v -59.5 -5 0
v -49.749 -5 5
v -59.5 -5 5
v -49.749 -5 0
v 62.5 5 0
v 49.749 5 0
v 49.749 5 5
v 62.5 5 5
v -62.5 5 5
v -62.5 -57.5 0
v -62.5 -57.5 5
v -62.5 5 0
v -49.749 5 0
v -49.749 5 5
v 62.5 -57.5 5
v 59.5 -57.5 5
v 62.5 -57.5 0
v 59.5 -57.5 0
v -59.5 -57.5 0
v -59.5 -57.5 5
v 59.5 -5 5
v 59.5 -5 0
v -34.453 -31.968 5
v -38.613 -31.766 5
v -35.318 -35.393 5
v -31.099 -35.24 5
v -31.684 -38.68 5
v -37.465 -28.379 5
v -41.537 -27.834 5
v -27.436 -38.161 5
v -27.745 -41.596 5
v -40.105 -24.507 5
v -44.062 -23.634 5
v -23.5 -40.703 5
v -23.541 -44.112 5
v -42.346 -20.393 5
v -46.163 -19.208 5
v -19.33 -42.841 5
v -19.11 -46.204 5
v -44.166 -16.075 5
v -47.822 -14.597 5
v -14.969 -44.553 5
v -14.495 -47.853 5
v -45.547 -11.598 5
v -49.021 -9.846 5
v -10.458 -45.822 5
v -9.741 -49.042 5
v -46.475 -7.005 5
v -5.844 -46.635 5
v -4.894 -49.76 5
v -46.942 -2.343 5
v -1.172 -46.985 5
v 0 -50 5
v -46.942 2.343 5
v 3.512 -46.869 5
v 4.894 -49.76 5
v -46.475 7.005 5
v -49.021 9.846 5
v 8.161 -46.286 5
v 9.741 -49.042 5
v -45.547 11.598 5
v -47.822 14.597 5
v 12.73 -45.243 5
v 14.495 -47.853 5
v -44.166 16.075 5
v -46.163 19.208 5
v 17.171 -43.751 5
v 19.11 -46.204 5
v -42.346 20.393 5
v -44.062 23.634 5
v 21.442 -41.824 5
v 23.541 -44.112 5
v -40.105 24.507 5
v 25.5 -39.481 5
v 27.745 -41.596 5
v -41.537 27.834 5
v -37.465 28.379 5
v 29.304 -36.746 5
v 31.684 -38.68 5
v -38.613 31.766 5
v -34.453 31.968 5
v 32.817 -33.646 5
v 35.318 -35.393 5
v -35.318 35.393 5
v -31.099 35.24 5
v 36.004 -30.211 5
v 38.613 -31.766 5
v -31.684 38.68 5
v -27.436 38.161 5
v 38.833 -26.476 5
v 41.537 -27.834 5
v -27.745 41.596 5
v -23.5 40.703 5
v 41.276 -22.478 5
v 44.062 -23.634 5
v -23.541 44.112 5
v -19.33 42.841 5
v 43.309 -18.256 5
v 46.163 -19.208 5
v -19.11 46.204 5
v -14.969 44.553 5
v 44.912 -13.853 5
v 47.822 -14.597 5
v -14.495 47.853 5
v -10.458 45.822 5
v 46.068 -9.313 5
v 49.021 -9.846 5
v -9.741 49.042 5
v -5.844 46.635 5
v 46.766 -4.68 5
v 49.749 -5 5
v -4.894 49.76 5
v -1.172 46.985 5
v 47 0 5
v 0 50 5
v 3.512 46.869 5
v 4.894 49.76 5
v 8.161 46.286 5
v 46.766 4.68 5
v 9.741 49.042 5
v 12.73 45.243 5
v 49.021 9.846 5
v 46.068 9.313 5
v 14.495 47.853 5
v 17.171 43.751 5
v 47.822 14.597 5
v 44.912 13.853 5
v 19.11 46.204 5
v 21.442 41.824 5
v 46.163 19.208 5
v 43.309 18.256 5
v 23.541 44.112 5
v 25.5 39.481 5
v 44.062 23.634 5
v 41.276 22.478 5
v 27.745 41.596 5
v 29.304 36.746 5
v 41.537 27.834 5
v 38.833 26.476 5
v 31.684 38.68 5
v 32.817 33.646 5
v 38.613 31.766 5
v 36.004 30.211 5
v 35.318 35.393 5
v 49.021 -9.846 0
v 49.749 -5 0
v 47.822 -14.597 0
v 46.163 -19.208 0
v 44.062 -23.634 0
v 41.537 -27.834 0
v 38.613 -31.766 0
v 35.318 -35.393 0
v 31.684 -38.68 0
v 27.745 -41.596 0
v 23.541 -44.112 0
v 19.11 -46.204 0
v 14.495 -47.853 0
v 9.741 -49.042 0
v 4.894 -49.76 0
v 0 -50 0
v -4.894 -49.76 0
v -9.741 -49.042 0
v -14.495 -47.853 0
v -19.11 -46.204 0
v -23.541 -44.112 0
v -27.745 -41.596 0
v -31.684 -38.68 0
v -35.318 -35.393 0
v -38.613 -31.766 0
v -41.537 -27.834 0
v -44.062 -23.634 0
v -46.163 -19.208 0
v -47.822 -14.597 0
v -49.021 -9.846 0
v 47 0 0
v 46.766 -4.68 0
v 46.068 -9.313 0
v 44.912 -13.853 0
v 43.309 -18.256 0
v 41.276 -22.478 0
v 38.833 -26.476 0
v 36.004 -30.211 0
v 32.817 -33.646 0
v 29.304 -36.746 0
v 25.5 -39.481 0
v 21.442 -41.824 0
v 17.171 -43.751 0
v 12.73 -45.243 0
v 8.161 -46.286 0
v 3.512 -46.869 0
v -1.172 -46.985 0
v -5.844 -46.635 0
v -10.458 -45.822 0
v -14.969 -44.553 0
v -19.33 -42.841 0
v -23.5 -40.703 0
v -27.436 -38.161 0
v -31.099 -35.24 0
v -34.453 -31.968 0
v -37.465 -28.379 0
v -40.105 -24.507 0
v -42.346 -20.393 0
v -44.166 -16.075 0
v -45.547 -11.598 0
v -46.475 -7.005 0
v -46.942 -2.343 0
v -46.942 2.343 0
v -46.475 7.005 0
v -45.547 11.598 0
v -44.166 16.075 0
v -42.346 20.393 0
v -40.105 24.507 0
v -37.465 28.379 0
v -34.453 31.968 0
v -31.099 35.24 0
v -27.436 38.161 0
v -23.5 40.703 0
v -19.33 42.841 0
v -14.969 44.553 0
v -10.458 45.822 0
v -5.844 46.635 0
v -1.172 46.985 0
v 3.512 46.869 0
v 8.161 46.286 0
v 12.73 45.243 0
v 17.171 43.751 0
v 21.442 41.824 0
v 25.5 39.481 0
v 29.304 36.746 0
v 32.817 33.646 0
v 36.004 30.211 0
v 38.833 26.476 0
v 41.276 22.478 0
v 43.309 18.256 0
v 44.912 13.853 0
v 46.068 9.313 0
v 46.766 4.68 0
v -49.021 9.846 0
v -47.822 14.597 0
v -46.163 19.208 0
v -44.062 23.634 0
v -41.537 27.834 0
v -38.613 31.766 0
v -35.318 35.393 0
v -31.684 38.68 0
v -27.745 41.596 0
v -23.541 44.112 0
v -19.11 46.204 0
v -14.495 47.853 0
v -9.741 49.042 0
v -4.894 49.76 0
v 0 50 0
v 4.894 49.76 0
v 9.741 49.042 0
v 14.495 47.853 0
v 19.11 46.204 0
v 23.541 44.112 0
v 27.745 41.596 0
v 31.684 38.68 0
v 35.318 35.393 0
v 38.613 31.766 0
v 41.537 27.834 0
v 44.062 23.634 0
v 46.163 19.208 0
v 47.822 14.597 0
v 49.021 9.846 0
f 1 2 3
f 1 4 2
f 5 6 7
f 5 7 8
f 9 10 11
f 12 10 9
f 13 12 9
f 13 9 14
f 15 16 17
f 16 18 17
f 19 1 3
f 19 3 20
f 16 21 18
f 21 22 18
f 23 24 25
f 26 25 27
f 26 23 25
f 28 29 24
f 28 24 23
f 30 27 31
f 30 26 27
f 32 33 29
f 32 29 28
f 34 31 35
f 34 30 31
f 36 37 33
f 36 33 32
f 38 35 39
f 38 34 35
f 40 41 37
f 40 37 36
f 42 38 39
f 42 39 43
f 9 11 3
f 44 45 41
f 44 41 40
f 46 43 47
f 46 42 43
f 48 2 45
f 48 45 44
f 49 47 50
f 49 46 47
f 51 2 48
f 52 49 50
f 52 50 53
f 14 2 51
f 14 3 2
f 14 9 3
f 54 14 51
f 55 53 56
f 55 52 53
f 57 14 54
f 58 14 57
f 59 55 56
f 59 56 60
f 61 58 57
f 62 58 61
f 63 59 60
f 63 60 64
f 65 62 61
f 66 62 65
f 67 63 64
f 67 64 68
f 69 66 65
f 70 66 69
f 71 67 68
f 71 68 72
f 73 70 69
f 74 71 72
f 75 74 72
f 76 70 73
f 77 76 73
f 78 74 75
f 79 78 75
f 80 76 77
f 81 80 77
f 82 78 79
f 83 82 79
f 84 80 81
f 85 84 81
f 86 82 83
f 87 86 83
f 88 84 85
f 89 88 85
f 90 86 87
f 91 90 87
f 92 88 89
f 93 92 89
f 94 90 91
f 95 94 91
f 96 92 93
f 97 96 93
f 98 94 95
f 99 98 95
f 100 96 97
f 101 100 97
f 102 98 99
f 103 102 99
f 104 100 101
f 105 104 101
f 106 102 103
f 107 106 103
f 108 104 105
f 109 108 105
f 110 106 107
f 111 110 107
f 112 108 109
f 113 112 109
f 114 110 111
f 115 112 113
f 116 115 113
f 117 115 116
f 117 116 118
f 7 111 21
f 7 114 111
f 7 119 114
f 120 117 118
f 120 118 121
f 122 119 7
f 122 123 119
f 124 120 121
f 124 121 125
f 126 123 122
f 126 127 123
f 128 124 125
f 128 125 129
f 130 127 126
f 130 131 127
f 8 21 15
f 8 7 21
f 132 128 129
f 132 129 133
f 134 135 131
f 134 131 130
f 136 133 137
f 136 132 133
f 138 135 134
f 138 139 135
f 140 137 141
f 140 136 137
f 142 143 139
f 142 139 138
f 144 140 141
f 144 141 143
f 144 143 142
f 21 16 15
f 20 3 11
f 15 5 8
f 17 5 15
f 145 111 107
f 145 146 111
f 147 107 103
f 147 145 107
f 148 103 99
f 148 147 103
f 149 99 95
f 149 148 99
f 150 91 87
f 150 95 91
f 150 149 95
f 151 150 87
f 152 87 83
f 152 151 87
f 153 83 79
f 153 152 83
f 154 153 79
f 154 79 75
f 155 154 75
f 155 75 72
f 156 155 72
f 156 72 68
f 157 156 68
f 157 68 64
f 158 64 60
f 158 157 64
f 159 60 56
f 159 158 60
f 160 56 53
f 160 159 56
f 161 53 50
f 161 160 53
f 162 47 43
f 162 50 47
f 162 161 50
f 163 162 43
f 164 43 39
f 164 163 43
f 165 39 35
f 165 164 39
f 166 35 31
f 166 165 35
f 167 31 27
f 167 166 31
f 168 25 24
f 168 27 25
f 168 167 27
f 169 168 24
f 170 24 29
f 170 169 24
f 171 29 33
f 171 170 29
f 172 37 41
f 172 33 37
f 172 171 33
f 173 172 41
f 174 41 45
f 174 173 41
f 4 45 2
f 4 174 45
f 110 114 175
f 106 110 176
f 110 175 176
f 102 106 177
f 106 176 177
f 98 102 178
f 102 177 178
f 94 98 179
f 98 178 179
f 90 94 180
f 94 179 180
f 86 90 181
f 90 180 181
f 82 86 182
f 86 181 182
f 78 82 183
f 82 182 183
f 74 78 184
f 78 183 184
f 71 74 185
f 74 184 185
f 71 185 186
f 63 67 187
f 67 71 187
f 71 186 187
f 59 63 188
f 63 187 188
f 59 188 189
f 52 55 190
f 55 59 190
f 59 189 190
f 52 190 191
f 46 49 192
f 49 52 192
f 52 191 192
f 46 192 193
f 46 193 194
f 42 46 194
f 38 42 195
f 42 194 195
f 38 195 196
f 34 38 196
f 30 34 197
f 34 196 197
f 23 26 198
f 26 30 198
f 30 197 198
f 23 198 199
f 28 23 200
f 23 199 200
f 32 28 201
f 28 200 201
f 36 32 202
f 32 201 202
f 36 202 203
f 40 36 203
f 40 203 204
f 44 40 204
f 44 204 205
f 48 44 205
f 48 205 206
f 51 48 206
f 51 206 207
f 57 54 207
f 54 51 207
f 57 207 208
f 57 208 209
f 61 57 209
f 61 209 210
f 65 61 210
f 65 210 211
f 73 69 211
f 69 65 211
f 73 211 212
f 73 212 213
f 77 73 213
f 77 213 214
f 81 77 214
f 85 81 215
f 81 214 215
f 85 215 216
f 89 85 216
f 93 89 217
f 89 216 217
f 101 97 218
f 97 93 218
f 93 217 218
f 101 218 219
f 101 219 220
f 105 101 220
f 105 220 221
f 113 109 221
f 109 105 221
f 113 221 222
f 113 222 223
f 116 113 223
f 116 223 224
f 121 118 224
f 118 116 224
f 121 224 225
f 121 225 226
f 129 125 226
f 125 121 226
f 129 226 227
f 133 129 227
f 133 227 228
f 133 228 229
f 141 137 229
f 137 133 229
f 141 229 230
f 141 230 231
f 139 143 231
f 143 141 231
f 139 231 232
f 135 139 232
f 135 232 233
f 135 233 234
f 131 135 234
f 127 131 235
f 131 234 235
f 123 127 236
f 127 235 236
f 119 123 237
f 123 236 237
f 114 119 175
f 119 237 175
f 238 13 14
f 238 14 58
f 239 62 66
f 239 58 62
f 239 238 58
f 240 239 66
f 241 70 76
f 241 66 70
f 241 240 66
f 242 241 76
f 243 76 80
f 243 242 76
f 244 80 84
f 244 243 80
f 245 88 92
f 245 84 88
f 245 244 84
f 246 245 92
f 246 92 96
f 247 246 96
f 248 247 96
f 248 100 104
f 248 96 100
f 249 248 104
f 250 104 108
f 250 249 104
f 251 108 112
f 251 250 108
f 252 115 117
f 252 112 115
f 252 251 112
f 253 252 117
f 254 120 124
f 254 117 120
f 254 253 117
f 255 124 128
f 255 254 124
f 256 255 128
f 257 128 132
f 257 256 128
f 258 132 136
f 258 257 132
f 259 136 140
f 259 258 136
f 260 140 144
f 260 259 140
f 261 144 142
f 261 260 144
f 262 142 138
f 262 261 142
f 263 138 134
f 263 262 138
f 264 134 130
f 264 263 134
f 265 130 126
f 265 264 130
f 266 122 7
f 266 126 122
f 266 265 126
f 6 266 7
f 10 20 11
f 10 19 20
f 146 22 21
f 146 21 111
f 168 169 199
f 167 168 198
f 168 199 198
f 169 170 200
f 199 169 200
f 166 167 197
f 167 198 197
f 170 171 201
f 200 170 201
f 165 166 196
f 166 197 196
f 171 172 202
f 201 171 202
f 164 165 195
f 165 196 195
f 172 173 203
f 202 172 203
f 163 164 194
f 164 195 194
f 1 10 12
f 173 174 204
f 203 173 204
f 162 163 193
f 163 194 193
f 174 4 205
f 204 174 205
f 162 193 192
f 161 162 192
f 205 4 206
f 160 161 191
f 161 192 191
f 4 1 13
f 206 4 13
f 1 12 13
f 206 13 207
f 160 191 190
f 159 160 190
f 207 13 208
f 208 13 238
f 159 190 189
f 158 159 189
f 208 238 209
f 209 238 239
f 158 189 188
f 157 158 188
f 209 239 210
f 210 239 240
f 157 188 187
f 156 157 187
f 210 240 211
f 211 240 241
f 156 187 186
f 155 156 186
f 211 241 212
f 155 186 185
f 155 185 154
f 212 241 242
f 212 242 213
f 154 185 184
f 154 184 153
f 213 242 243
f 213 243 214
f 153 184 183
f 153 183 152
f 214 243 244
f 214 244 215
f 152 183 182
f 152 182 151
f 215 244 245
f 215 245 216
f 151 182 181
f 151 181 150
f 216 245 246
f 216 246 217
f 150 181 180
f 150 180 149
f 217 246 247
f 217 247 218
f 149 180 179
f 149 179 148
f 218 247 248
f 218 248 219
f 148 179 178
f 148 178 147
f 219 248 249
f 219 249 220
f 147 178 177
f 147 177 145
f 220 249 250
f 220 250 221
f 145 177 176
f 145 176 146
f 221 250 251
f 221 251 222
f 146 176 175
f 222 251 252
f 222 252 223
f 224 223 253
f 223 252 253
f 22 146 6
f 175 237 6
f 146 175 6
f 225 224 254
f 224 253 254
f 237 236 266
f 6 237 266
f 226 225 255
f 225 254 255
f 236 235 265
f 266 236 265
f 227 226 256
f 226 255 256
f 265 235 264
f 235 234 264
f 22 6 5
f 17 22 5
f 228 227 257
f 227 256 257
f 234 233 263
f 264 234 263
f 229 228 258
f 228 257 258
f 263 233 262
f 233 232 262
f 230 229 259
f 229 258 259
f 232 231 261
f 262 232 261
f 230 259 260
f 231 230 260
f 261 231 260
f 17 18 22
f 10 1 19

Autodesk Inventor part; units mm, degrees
ref_plane "YZ Plane" through (0, 0, 0) normal (1, 0, 0) x (0, 1, 0)
ref_plane "XZ Plane" through (0, 0, 0) normal (0, 1, 0) x (-1, 0, 0)
ref_plane "XY Plane" through (0, 0, 0) normal (0, 0, 1) x (1, 0, 0)
sketch "Sketch1" plane through (0, 0, 0) normal (0, 0, 1) x (1, 0, 0)
  circle A0 centre (0, 0) radius 50
  circle A1 centre (0, 0) radius 47
  line L0 (37.5, 5) -> (62.5, 5)
  line L1 (62.5, 5) -> (62.5, -5)
  line L2 (62.5, -5) -> (37.5, -5)
  line L3 (37.5, -5) -> (37.5, 5)
  line L4 (37.5, 5) -> (62.5, -5) construction
  line L5 (62.5, 5) -> (37.5, -5) construction
  line L6 (-62.5, 5) -> (-37.5, 5)
  line L7 (-37.5, 5) -> (-37.5, -5)
  line L8 (-37.5, -5) -> (-62.5, -5)
  line L9 (-62.5, -5) -> (-62.5, 5)
  line L10 (-62.5, 5) -> (-37.5, -5) construction
  line L11 (-37.5, 5) -> (-62.5, -5) construction
  line L12 (62.5, 0) -> (59.5, 0)
  line L13 (59.5, 0) -> (59.5, -57.5)
  line L14 (59.5, -57.5) -> (62.5, -57.5)
  line L15 (62.5, -57.5) -> (62.5, 0)
  line L16 (-62.5, 0) -> (-59.5, 0)
  line L17 (-59.5, 0) -> (-59.5, -57.5)
  line L18 (-59.5, -57.5) -> (-62.5, -57.5)
  line L19 (-62.5, -57.5) -> (-62.5, 0)
  point P0 (50, 0)
  point P1 (-50, 0)
  point P2 (49.7494, 5)
  point P3 (-49.7494, 5)
  point P4 (-59.5, -5)
  point P5 (-49.7494, -5)
  point P6 (49.7494, -5)
  point P7 (59.5, -5)
  dimension "d0" = 100
  dimension "d1" = 94
  dimension "d2" = 25
  dimension "d3" = 10
  dimension "d4" = 25
  dimension "d5" = 10
  dimension "d6" = 3
  dimension "d7" = 57.5
  dimension "d8" = 3
  dimension "d9" = 57.5
extrude "Extrusion1" add sketch "Sketch1" along normal blind 5 contours A0 L2 A1 L0 | A0 L0 L1 L12 L13 L2 | L0 A1 L6 A0 | A0 L8 A1 L2 | L6 A1 L8 A0 | A0 L8 L17 L16 L9 L6 | L13 L12 L1 L2 | L2 L15 L14 L13 | L17 L18 L19 L8 | L8 L9 L16 L17
properties part number "PIEZA_JACLUBER_2" material "Steel, Mild, Welded"
